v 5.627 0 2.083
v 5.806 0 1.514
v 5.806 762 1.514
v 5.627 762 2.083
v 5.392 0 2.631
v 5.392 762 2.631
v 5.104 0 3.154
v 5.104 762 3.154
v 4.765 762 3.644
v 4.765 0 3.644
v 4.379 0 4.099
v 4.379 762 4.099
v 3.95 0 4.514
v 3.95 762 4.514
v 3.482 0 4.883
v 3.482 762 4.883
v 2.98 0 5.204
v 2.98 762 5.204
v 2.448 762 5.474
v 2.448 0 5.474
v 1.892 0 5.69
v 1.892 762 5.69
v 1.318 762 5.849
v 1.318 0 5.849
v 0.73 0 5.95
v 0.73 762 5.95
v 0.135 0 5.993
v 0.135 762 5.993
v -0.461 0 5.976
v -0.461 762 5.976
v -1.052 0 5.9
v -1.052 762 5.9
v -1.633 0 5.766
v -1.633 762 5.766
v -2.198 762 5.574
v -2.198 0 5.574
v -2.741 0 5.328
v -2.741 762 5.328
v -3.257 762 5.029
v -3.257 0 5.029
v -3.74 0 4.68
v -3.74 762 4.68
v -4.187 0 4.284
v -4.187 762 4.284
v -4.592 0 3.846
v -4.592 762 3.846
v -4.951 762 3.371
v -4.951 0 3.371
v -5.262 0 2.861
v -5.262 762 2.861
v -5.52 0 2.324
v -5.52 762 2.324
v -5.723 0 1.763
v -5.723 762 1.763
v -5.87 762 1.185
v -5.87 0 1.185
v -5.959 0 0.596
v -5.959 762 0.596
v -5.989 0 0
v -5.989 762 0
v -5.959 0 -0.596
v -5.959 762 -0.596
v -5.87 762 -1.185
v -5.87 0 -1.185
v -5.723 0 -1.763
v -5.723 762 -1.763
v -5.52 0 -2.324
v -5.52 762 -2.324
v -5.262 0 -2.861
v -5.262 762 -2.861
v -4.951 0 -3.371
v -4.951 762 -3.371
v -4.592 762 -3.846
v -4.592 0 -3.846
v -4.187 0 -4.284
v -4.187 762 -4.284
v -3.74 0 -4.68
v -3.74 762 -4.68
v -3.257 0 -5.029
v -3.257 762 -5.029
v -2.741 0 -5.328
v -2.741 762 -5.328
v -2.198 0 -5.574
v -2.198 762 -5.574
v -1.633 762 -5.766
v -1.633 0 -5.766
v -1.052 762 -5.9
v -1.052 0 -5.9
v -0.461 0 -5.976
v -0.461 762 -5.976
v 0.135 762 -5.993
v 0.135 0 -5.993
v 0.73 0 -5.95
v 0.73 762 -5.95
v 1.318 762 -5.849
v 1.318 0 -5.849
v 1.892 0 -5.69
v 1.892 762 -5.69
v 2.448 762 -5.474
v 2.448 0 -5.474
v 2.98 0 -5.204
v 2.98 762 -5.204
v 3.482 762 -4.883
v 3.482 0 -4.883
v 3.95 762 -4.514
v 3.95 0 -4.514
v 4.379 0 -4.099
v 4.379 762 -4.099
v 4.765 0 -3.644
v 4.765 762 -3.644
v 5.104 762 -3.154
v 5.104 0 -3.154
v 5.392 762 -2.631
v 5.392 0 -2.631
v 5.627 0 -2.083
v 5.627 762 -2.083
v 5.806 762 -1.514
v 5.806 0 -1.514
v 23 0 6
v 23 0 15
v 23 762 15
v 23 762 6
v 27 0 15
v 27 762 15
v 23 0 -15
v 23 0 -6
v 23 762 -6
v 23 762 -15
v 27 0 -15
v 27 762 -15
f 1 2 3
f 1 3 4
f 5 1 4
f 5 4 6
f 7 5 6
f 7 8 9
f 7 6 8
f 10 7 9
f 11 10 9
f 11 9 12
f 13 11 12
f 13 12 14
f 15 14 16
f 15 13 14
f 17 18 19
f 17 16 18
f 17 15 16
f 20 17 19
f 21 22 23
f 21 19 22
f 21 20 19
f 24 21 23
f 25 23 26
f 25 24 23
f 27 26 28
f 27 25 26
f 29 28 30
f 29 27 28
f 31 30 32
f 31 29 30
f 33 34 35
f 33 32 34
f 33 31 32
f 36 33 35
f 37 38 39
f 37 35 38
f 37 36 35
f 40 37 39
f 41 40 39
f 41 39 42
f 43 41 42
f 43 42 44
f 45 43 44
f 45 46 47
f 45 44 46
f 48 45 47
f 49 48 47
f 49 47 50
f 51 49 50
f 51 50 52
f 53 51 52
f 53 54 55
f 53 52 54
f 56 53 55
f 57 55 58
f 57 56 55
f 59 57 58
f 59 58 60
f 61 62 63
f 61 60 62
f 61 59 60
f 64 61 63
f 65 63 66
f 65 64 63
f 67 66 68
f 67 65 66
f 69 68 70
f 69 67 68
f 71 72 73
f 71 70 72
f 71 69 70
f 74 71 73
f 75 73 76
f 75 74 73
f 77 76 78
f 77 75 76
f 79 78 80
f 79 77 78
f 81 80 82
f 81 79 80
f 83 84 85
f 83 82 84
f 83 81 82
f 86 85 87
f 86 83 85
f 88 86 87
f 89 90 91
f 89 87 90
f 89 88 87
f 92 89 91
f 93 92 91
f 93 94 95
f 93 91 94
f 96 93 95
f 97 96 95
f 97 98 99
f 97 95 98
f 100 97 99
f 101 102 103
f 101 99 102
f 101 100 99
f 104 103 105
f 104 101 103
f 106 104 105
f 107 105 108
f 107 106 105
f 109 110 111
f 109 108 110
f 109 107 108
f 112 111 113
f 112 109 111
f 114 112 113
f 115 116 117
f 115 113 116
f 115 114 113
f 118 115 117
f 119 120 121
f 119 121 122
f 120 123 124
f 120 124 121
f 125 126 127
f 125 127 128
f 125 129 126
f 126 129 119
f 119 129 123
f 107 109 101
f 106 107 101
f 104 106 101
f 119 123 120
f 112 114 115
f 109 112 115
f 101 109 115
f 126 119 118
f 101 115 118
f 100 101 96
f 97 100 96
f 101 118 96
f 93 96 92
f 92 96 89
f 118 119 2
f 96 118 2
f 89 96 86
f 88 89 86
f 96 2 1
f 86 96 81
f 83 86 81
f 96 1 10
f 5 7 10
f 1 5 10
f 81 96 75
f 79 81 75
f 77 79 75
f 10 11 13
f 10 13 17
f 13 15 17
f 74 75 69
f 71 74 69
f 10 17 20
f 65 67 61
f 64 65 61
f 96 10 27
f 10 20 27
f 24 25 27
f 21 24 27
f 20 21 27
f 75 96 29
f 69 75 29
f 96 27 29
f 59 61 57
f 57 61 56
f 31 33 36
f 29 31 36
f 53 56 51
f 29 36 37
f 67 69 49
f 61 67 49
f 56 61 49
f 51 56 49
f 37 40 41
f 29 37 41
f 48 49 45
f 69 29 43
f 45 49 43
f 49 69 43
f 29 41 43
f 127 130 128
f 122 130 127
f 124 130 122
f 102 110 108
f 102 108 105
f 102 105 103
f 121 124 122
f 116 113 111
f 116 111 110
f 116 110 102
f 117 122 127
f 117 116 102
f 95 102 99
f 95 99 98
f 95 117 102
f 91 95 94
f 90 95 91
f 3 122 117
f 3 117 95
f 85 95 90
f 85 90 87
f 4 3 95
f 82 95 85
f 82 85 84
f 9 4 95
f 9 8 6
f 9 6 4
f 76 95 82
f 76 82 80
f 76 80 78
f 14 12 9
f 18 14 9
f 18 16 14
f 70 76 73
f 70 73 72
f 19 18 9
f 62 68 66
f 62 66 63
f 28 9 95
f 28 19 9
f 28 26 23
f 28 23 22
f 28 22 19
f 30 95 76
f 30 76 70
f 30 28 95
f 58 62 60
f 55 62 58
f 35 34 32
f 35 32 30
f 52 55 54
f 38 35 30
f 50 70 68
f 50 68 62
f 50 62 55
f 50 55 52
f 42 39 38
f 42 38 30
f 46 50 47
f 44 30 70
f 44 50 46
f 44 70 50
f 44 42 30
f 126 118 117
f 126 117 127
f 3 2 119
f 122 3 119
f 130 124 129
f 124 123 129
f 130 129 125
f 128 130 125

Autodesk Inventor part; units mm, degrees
ref_plane "YZ Plane" through (0, 0, 0) normal (1, 0, 0) x (0, 1, 0)
ref_plane "XZ Plane" through (0, 0, 0) normal (0, 1, 0) x (-1, 0, 0)
ref_plane "XY Plane" through (0, 0, 0) normal (0, 0, 1) x (1, 0, 0)
sketch "Sketch1" plane through (0, 0, 0) normal (0, 1, 0) x (-1, 0, 0)
  line L0 (-6, 0) -> (0, 0) construction
  line L1 (-27, 15) -> (-27, -15)
  line L2 (-27, 15) -> (-23, 15)
  line L3 (-27, -15) -> (-23, -15)
  line L4 (-5.8057, 1.5145) -> (-23, 6)
  line L5 (-5.8057, -1.5145) -> (-23, -6)
  arc A0 (-5.8057, -1.5145) -> (-5.8057, 1.5145) centre (-0.0058, 0) ccw
  line L6 (-23, 15) -> (-23, 6)
  line L7 (-23, -6) -> (-23, -15)
  dimension "d6" = 30
  dimension "d7" = 4
  dimension "d8" = 4
  dimension "d10" = 5.9944
extrude "Extrusion1" add sketch "Sketch1" along normal blind 762
properties part number "supportedLinearRail12mm_30inches"
